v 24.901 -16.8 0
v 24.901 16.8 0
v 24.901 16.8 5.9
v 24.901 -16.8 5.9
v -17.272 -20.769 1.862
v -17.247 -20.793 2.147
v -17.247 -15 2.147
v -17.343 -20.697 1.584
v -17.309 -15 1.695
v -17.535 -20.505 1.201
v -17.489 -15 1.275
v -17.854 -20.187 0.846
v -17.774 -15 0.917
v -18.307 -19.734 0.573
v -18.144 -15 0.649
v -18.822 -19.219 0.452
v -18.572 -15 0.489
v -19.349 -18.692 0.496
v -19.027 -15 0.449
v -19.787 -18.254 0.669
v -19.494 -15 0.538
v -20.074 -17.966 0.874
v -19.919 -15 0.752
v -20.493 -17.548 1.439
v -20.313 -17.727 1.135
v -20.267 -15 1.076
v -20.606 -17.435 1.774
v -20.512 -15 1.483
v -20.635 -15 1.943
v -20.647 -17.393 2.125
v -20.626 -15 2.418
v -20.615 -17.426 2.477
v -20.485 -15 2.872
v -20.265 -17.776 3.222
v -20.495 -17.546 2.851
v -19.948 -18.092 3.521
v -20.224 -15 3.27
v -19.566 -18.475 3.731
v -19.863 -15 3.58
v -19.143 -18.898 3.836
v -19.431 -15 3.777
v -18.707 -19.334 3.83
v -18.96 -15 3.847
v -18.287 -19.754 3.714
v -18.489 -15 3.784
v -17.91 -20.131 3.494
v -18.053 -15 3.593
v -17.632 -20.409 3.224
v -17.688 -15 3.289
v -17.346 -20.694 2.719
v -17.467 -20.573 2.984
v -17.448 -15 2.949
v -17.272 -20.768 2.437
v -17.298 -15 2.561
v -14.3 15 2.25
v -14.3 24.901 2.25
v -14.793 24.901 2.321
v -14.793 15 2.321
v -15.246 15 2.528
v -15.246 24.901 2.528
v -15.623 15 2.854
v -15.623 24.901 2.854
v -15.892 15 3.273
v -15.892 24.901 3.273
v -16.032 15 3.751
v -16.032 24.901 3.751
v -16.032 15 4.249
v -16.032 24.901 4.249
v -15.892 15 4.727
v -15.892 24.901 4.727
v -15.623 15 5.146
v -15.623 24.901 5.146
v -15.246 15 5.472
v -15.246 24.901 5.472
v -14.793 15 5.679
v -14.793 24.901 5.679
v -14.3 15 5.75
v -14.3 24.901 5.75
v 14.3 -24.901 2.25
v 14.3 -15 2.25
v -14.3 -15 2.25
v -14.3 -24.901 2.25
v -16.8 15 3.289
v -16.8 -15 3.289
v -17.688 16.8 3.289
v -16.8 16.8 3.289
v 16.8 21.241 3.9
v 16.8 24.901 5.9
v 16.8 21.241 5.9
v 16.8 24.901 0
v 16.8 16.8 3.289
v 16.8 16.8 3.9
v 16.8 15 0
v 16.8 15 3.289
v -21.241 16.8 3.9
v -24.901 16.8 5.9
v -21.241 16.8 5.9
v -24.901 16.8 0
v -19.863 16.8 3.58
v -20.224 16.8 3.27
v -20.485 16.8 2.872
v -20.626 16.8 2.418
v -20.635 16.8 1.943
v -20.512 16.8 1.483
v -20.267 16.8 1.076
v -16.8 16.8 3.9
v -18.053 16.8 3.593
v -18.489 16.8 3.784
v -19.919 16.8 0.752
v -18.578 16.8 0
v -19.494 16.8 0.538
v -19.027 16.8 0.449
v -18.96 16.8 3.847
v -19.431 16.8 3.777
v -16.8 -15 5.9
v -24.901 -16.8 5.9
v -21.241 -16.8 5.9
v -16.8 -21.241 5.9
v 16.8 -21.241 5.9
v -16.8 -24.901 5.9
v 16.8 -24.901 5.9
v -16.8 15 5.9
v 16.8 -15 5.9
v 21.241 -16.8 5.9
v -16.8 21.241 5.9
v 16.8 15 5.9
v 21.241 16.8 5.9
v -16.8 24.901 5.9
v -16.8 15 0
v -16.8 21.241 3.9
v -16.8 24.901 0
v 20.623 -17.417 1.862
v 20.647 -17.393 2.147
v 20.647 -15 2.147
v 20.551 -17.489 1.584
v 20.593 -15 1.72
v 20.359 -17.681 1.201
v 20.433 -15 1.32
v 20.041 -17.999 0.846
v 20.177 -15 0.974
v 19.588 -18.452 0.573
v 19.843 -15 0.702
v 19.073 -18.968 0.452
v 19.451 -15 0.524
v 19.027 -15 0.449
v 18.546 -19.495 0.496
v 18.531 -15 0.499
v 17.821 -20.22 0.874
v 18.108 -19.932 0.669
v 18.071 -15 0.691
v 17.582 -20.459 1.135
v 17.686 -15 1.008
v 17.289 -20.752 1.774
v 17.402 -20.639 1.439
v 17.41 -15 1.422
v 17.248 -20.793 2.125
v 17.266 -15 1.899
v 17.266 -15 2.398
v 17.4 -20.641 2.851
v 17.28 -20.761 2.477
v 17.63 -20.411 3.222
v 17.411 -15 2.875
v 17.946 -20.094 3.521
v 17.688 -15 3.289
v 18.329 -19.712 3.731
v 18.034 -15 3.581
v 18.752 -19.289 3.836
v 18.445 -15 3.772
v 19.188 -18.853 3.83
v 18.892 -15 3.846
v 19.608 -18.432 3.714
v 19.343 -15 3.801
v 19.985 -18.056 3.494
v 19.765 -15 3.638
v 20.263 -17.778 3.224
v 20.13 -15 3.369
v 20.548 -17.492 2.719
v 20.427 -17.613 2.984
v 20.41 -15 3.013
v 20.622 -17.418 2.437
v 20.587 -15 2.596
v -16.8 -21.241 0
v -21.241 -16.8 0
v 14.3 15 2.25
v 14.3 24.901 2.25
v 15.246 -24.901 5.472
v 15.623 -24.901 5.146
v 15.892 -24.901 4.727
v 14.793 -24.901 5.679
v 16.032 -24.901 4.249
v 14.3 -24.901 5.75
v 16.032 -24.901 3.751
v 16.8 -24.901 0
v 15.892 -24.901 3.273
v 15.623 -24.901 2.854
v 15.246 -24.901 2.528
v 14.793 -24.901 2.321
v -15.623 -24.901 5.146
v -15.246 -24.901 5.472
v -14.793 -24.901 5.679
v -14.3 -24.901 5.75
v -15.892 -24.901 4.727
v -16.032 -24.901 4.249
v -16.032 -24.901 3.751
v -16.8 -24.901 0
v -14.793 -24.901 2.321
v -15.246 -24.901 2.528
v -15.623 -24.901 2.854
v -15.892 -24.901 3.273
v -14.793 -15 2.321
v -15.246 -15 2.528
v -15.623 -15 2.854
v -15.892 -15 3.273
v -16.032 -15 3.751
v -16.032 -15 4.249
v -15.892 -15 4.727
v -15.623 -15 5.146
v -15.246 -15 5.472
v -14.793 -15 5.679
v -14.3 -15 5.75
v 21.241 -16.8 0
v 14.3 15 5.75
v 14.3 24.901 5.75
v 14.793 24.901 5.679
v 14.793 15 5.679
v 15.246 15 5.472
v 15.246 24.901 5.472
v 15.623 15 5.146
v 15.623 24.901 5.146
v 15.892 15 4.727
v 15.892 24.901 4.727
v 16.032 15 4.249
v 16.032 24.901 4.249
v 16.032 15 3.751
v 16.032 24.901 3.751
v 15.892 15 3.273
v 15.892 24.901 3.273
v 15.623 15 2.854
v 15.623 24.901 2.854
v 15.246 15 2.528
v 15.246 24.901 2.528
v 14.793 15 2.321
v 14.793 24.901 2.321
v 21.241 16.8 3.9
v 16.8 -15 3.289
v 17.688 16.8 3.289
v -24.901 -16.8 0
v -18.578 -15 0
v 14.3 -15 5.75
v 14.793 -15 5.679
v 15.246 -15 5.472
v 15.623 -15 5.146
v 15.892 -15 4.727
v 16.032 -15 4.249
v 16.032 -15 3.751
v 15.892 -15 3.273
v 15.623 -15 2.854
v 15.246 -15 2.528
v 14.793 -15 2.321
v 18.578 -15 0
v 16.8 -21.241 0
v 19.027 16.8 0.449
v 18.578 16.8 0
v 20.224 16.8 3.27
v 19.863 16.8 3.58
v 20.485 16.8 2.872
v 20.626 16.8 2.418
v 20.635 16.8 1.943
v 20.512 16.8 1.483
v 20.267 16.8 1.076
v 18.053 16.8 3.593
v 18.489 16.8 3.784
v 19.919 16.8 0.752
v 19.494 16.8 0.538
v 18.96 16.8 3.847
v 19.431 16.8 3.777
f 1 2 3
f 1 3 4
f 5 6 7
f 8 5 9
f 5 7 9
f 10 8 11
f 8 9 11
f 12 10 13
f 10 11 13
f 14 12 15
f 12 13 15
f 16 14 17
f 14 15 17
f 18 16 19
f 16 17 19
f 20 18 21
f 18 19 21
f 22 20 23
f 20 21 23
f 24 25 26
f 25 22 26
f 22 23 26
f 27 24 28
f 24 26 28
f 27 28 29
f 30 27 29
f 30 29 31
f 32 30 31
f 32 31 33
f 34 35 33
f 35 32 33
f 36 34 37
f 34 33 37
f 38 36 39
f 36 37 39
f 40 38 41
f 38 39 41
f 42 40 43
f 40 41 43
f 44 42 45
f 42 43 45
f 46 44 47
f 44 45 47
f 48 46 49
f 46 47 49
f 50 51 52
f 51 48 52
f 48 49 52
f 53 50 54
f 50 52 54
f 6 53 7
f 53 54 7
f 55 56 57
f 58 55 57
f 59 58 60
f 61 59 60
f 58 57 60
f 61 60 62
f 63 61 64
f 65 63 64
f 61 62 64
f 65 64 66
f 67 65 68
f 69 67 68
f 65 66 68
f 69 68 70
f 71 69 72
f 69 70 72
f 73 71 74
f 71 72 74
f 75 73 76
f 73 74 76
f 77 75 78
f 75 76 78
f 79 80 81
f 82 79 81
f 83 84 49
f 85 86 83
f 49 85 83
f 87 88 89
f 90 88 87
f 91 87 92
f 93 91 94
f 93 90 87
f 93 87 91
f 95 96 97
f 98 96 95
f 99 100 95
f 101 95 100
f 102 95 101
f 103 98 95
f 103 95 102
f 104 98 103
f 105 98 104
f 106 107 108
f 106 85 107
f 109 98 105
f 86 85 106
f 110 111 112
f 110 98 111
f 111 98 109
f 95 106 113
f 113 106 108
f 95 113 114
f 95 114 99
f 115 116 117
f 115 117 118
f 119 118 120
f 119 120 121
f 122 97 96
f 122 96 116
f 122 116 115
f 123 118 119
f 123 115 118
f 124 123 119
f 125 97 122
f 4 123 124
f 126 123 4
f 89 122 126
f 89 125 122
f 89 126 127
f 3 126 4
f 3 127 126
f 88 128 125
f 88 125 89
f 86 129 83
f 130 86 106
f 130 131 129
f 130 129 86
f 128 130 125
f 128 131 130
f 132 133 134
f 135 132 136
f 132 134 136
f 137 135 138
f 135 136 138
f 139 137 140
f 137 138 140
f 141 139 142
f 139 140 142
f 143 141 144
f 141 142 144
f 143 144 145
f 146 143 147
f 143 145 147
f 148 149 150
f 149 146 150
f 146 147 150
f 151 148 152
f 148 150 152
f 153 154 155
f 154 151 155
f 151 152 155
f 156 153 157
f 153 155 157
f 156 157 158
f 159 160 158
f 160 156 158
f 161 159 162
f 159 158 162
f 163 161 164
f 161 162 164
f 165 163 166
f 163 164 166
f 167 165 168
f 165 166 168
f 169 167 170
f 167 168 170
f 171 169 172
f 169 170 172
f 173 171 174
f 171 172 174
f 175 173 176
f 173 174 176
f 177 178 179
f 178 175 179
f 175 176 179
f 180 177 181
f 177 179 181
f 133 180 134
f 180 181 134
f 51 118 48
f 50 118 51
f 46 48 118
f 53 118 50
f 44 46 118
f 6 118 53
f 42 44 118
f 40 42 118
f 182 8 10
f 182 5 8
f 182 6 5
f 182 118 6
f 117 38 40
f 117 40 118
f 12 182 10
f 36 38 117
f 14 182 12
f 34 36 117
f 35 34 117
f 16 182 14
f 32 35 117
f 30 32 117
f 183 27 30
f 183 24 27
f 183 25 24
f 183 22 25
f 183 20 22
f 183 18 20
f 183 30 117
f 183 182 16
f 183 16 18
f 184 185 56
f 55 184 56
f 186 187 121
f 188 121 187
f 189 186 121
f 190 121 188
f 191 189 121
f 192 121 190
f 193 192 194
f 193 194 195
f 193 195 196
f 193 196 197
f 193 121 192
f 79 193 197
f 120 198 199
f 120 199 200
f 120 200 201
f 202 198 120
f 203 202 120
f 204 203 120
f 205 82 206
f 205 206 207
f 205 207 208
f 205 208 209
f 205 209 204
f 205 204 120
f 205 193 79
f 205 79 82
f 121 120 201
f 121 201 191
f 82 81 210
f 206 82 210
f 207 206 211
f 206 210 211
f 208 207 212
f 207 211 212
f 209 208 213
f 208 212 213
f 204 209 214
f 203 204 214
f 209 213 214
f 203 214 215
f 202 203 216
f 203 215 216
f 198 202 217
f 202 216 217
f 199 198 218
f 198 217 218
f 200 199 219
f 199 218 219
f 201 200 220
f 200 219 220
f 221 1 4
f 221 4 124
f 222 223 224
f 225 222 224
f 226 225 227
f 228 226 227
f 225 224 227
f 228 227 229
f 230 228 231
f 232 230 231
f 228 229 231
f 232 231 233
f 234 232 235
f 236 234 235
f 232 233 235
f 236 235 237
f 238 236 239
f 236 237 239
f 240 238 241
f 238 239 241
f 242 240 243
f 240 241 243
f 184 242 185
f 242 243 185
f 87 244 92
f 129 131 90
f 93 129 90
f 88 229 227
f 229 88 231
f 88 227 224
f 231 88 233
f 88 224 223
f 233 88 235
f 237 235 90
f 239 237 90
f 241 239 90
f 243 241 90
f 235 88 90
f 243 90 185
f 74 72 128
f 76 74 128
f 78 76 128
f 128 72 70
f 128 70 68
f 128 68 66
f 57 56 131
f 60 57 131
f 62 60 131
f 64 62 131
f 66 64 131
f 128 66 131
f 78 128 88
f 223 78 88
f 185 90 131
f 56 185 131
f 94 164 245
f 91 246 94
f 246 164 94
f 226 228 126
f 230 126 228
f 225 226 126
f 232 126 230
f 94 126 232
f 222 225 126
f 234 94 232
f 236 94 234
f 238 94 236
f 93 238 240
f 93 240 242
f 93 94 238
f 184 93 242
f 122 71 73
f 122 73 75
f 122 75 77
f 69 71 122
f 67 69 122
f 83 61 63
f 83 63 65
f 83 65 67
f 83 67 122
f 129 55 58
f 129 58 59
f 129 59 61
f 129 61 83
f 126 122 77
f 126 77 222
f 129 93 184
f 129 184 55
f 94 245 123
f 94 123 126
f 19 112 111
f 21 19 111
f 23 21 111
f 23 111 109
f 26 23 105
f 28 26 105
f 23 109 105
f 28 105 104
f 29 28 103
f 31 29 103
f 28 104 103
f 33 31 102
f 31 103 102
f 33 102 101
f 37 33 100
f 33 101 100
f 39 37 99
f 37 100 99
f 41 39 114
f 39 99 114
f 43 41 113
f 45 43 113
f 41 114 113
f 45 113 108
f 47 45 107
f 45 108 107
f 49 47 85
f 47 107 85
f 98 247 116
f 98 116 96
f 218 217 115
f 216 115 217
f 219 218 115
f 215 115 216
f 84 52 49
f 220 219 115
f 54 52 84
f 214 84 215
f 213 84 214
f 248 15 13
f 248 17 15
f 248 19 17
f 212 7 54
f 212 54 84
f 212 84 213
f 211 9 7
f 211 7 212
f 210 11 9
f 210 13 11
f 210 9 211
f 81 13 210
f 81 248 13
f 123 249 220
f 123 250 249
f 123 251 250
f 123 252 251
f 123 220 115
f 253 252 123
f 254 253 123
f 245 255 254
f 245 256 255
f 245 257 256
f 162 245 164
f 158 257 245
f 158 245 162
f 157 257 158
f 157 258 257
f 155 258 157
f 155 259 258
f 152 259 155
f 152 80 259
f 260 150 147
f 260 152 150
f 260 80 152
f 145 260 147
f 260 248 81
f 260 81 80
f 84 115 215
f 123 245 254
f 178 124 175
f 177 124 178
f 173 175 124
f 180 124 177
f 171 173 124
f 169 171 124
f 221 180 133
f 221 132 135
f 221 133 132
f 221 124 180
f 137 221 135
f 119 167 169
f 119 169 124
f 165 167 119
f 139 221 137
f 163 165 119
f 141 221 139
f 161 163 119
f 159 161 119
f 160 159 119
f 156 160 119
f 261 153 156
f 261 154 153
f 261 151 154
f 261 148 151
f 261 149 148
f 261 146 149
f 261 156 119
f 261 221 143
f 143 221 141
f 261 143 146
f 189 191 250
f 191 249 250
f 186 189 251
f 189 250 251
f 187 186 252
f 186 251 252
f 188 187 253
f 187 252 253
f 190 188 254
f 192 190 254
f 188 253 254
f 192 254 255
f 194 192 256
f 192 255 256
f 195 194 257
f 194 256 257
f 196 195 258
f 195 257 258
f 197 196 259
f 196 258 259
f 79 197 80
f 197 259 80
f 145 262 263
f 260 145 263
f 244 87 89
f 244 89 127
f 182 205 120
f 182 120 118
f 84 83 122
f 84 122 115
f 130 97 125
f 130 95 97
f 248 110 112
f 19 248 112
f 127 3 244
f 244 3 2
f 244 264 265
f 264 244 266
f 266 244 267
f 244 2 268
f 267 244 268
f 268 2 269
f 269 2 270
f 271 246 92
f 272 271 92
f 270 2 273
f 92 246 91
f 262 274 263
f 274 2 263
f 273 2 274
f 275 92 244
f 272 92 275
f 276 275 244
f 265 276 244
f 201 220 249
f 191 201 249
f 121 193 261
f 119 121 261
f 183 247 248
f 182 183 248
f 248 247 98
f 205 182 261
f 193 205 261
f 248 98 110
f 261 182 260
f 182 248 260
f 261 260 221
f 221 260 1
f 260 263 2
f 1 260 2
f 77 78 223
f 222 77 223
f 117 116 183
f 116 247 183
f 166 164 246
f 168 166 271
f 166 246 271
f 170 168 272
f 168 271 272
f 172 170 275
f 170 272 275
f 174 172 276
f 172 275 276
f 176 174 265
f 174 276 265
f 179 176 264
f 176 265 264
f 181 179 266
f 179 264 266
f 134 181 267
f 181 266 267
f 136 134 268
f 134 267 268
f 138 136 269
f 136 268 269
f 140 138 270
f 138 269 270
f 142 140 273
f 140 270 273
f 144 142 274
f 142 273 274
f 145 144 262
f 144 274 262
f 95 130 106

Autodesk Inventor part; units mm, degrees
ref_plane "YZ Plane" through (0, 0, 0) normal (1, 0, 0) x (0, 1, 0)
ref_plane "XZ Plane" through (0, 0, 0) normal (0, 1, 0) x (-1, 0, 0)
ref_plane "XY Plane" through (0, 0, 0) normal (0, 0, 1) x (1, 0, 0)
sketch "Sketch1" plane through (0, 0, 0) normal (0, 0, 1) x (1, 0, 0)
  line L0 (-51.8104, 0) -> (51.8104, 0) construction
  line L1 (0, -35.1144) -> (0, 36.3819) construction
  line L2 (0, 0) -> (26.1682, 26.1682) construction
  line L3 (0, 0) -> (37.0074, 0) construction
  line L4 (16.8, 24.9006) -> (16.8, 21.2406)
  line L5 (16.8, 21.2406) -> (19.0203, 19.0203)
  line L6 (16.8, 24.9006) -> (0, 24.9006)
  line L7 (24.9006, 16.8) -> (21.2406, 16.8)
  line L8 (21.2406, 16.8) -> (19.0203, 19.0203)
  line L9 (24.9006, 16.8) -> (24.9006, 0)
  line L10 (0, 0) -> (-37.0074, 0) construction
  line L11 (-16.8, 24.9006) -> (-16.8, 21.2406)
  line L12 (-16.8, 21.2406) -> (-19.0203, 19.0203)
  line L13 (-16.8, 24.9006) -> (0, 24.9006)
  line L14 (-24.9006, 16.8) -> (-24.9006, 0)
  line L15 (-24.9006, 16.8) -> (-21.2406, 16.8)
  line L16 (-21.2406, 16.8) -> (-19.0203, 19.0203)
  line L17 (16.8, -24.9006) -> (16.8, -21.2406)
  line L18 (16.8, -21.2406) -> (19.0203, -19.0203)
  line L19 (16.8, -24.9006) -> (0, -24.9006)
  line L20 (24.9006, -16.8) -> (24.9006, 0)
  line L21 (24.9006, -16.8) -> (21.2406, -16.8)
  line L22 (21.2406, -16.8) -> (19.0203, -19.0203)
  line L23 (-16.8, -24.9006) -> (-16.8, -21.2406)
  line L24 (-16.8, -21.2406) -> (-19.0203, -19.0203)
  line L25 (-16.8, -24.9006) -> (0, -24.9006)
  line L26 (-24.9006, -16.8) -> (-24.9006, 0)
  line L27 (-24.9006, -16.8) -> (-21.2406, -16.8)
  line L28 (-21.2406, -16.8) -> (-19.0203, -19.0203)
  line L29 (-16.8, -16.8) -> (16.8, 16.8) construction
  line L30 (17.4242, -17.4242) -> (-16.0391, 16.0391) construction
  line L31 (-16.8, -15) -> (16.8, -15)
  line L32 (16.8, -15) -> (16.8, 15)
  line L33 (16.8, 15) -> (-16.8, 15)
  line L34 (-16.8, 15) -> (-16.8, -15)
  line L35 (-16.8, -15) -> (16.8, 15) construction
  line L36 (16.8, -15) -> (-16.8, 15) construction
  dimension "d0" = 45
  dimension "d1" = 3.14
  dimension "d2" = 3.66
  dimension "d4" = 16.8
  dimension "d16" = 33.6
  dimension "d17" = 30
extrude "Extrusion1" add sketch "Sketch1" along normal blind 8
sketch "Sketch2" plane through (-16.8, 24.9006, 0) normal (0, 1, 0) x (1, 0, 0)
  line L0 (-8.1006, 0) -> (-4.4406, 0) construction
  line L1 (-8.1006, 0) -> (-8.1006, -8) construction
  line L2 (-4.4406, -8) -> (-8.1006, -8) construction
  line L3 (-4.4406, 0) -> (-4.4406, -8) construction
  line L4 (-4.4406, 0) -> (0, 0) construction
  line L5 (-4.4406, 0) -> (-4.4406, -8) construction
  line L6 (0, -8) -> (-4.4406, -8) construction
  line L7 (0, 0) -> (0, -8) construction
  line L8 (0, 0) -> (33.6, 0) construction
  line L9 (0, 0) -> (0, -8) construction
  line L10 (33.6, -8) -> (0, -8) construction
  line L11 (33.6, 0) -> (33.6, -8) construction
  line L12 (33.6, 0) -> (38.0406, 0) construction
  line L13 (33.6, 0) -> (33.6, -8) construction
  line L14 (38.0406, -8) -> (33.6, -8) construction
  line L15 (38.0406, 0) -> (38.0406, -8) construction
  line L16 (38.0406, 0) -> (41.7006, 0) construction
  line L17 (38.0406, 0) -> (38.0406, -8) construction
  line L18 (41.7006, -8) -> (38.0406, -8) construction
  line L19 (41.7006, 0) -> (41.7006, -8) construction
  line L20 (-0.9933, -0.6346) -> (2.8461, 5.7642) construction
  ellipse E0 centre (4.1754, 7.1215) end of major axis (2.3333, 6.6563) minor radius 1.8997 (5.4585, 5.7204) -> (2.8461, 5.7642) ccw construction
  line L21 (5.4585, 5.7204) -> (9.3415, -1.2728) construction
  line L22 (9.3415, -1.2728) -> (8.4179, -1.2574) construction
  line L23 (8.4179, -1.2574) -> (4.8304, 5.2036) construction
  ellipse E1 centre (5.2675, 5.4463) end of major axis (4.7828, 5.3239) minor radius 0.4999 (4.9945, 5.8651) -> (4.8304, 5.2036) ccw construction
  ellipse E2 centre (4.1754, 7.1215) end of major axis (2.7211, 6.7542) minor radius 1.4998 (4.9945, 5.8651) -> (3.3146, 5.8932) ccw construction
  ellipse E3 centre (3.0277, 5.4838) end of major axis (3.5125, 5.6062) minor radius 0.4999 (3.4564, 5.2266) -> (3.3146, 5.8932) ccw construction
  line L24 (3.4564, 5.2266) -> (-0.3461, -1.1107) construction
  ellipse E4 centre (-1.5262, -2.0366) end of major axis (-0.0719, -1.6693) minor radius 1.4998 (-0.9933, -0.6346) -> (-0.3461, -1.1107) ccw construction
  circle A0 centre (-2.1474, -2.1474) radius 1.7
  line L25 (-4.4406, 0) -> (0, 0) construction
  line L26 (0, 0) -> (-3.5302, -3.5302) construction
  line L27 (0, 0) -> (4.9925, 0) construction
  line L28 (0, 0) -> (2, 0)
  line L29 (0, 0) -> (-1.7777, 0)
  line L30 (-1.7777, 0) -> (-2.227, -0.4493)
  line L31 (0, 0) -> (0, -3.2892)
  line L32 (0, -3.2892) -> (-0.8879, -3.2892)
  point P0 (16.8, 0)
  dimension "d8" = 3.4
  dimension "d9" = 135
extrude "Extrusion2" cut sketch "Sketch2" against normal up to surface (39.9006 mm away)
sketch "Sketch3" plane through (0, 0, 0) normal (0, 0, -1) x (-1, 0, 0)
  line L0 (16.8, 15) -> (16.8, 24.9006) construction
  line L1 (16.8, 24.9006) -> (-16.8, 24.9006) construction
  line L2 (-16.8, 24.9006) -> (-16.8, 21.2406) construction
  line L3 (-16.8, 21.2406) -> (-21.2406, 16.8) construction
  line L4 (-21.2406, 16.8) -> (-24.9006, 16.8) construction
  line L5 (-24.9006, 16.8) -> (-24.9006, -16.8) construction
  line L6 (-24.9006, -16.8) -> (-21.2406, -16.8) construction
  line L7 (-21.2406, -16.8) -> (-16.8, -21.2406) construction
  line L8 (-16.8, -21.2406) -> (-16.8, -24.9006) construction
  line L9 (-16.8, -24.9006) -> (16.8, -24.9006) construction
  line L10 (16.8, -24.9006) -> (16.8, -21.2406) construction
  line L11 (16.8, -21.2406) -> (21.2406, -16.8) construction
  line L12 (21.2406, -16.8) -> (24.9006, -16.8) construction
  line L13 (24.9006, -16.8) -> (24.9006, 16.8) construction
  line L14 (24.9006, 16.8) -> (21.2406, 16.8) construction
  line L15 (21.2406, 16.8) -> (18.5777, 19.4629) construction
  line L16 (21.2406, 16.8) -> (24.9006, 16.8) construction
  line L17 (24.9006, 16.8) -> (21.2406, 16.8) projected
  line L18 (18.5777, 19.4629) -> (18.5777, -15) projected
  line L19 (16.8, 21.2406) -> (21.2406, 16.8) projected
  line L20 (21.2406, 16.8) -> (16.8, 21.2406)
  line L21 (16.8, 21.2406) -> (16.8, 16.8)
  line L22 (16.8, 16.8) -> (21.2406, 16.8)
  line L23 (18.5777, 19.4629) -> (18.5777, -15) projected
  line L24 (18.5777, -15) -> (-16.8, -15) projected
  line L25 (-16.8, -15) -> (-16.8, 15) projected
  line L26 (-16.8, 15) -> (16.8, 15) projected
  point P0 (0, 0)
  point P1 (18.5777, -16.8)
extrude "Extrusion3" cut sketch "Sketch3" against normal blind 3.9
mirror "Mirror1" about plane through (0, 0, 0) normal (1, 0, 0) of "Extrusion3", "Extrusion2"
sketch "Sketch4" plane through (-16.8, -15, 8) normal (0, 1, 0) x (1, 0, 0)
  line L0 (-1.7777, 8) -> (35.3777, 8) construction
  line L1 (-1.7777, 8) -> (-2.227, 7.5507) construction
  arc A0 (-2.227, 7.5507) -> (-0.8879, 4.7108) centre (-2.1474, 5.8526) ccw construction
  line L2 (-0.8879, 4.7108) -> (0, 4.7108) construction
  line L3 (0, 4.7108) -> (0, 0) construction
  line L4 (33.6, 0) -> (0, 0) construction
  line L5 (33.6, 4.7108) -> (33.6, 0) construction
  line L6 (34.4879, 4.7108) -> (33.6, 4.7108) construction
  arc A1 (34.4879, 4.7108) -> (35.827, 7.5507) centre (35.7474, 5.8526) ccw construction
  line L7 (35.3777, 8) -> (35.827, 7.5507) construction
  circle A2 centre (35.7474, 5.8526) radius 1.7
  circle A3 centre (-2.1474, 5.8526) radius 1.7
  point P0 (16.8, 8)
extrude "Extrusion4" cut sketch "Sketch4" against normal blind 10
sketch "Sketch5" plane through (-16.8, 24.9006, 0) normal (0, 1, 0) x (1, 0, 0)
  line L0 (0, 0) -> (33.6, 0) construction
  line L1 (0, 0) -> (0, -8) construction
  line L2 (33.6, -8) -> (0, -8) construction
  line L3 (33.6, 0) -> (33.6, -8) construction
  line L4 (16.8, 0) -> (16.8, -8) construction
  line L5 (33.6, 0) -> (33.6, -8) construction
  line L6 (0, 0) -> (0, -8) construction
  line L7 (33.6, -4) -> (0, -4) construction
  line L8 (2.5, -4) -> (31.1, -4) construction
  line L9 (2.5, -5.75) -> (31.1, -5.75)
  line L10 (31.1, -2.25) -> (2.5, -2.25)
  arc A0 (2.5, -2.25) -> (2.5, -5.75) centre (2.5, -4) ccw
  arc A1 (31.1, -5.75) -> (31.1, -2.25) centre (31.1, -4) ccw
  point P0 (16.8, -4)
  dimension "d20" = 3.5
  dimension "d21" = 2.5
extrude "Extrusion5" cut sketch "Sketch5" against normal through all
sketch "Sketch6" plane through (0, 0, 8) normal (0, 0, 1) x (1, 0, 0)
  line L0 (-16.8, -15) -> (-16.8, 15) projected
  line L1 (-16.8, 15) -> (16.8, 15) projected
  line L2 (16.8, 15) -> (16.8, -15) projected
  line L3 (16.8, -15) -> (-16.8, -15) projected
  line L4 (16.8, 21.2406) -> (16.8, 24.9006) projected
  line L5 (16.8, 24.9006) -> (-16.8, 24.9006) projected
  line L6 (-16.8, 24.9006) -> (-16.8, 21.2406) projected
  line L7 (-16.8, 21.2406) -> (-21.2406, 16.8) projected
  line L8 (-21.2406, 16.8) -> (-24.9006, 16.8) projected
  line L9 (-24.9006, 16.8) -> (-24.9006, -16.8) projected
  line L10 (-24.9006, -16.8) -> (-21.2406, -16.8) projected
  line L11 (-21.2406, -16.8) -> (-16.8, -21.2406) projected
  line L12 (-16.8, -21.2406) -> (-16.8, -24.9006) projected
  line L13 (-16.8, -24.9006) -> (16.8, -24.9006) projected
  line L14 (16.8, -24.9006) -> (16.8, -21.2406) projected
  line L15 (16.8, -21.2406) -> (21.2406, -16.8) projected
  line L16 (21.2406, -16.8) -> (24.9006, -16.8) projected
  line L17 (24.9006, -16.8) -> (24.9006, 16.8) projected
  line L18 (24.9006, 16.8) -> (21.2406, 16.8) projected
  line L19 (21.2406, 16.8) -> (16.8, 21.2406) projected
  point P0 (0, 0)
extrude "Extrusion6" cut sketch "Sketch6" against normal blind 2.1
properties part number "20_Rect_Aperture_Insert_half"
